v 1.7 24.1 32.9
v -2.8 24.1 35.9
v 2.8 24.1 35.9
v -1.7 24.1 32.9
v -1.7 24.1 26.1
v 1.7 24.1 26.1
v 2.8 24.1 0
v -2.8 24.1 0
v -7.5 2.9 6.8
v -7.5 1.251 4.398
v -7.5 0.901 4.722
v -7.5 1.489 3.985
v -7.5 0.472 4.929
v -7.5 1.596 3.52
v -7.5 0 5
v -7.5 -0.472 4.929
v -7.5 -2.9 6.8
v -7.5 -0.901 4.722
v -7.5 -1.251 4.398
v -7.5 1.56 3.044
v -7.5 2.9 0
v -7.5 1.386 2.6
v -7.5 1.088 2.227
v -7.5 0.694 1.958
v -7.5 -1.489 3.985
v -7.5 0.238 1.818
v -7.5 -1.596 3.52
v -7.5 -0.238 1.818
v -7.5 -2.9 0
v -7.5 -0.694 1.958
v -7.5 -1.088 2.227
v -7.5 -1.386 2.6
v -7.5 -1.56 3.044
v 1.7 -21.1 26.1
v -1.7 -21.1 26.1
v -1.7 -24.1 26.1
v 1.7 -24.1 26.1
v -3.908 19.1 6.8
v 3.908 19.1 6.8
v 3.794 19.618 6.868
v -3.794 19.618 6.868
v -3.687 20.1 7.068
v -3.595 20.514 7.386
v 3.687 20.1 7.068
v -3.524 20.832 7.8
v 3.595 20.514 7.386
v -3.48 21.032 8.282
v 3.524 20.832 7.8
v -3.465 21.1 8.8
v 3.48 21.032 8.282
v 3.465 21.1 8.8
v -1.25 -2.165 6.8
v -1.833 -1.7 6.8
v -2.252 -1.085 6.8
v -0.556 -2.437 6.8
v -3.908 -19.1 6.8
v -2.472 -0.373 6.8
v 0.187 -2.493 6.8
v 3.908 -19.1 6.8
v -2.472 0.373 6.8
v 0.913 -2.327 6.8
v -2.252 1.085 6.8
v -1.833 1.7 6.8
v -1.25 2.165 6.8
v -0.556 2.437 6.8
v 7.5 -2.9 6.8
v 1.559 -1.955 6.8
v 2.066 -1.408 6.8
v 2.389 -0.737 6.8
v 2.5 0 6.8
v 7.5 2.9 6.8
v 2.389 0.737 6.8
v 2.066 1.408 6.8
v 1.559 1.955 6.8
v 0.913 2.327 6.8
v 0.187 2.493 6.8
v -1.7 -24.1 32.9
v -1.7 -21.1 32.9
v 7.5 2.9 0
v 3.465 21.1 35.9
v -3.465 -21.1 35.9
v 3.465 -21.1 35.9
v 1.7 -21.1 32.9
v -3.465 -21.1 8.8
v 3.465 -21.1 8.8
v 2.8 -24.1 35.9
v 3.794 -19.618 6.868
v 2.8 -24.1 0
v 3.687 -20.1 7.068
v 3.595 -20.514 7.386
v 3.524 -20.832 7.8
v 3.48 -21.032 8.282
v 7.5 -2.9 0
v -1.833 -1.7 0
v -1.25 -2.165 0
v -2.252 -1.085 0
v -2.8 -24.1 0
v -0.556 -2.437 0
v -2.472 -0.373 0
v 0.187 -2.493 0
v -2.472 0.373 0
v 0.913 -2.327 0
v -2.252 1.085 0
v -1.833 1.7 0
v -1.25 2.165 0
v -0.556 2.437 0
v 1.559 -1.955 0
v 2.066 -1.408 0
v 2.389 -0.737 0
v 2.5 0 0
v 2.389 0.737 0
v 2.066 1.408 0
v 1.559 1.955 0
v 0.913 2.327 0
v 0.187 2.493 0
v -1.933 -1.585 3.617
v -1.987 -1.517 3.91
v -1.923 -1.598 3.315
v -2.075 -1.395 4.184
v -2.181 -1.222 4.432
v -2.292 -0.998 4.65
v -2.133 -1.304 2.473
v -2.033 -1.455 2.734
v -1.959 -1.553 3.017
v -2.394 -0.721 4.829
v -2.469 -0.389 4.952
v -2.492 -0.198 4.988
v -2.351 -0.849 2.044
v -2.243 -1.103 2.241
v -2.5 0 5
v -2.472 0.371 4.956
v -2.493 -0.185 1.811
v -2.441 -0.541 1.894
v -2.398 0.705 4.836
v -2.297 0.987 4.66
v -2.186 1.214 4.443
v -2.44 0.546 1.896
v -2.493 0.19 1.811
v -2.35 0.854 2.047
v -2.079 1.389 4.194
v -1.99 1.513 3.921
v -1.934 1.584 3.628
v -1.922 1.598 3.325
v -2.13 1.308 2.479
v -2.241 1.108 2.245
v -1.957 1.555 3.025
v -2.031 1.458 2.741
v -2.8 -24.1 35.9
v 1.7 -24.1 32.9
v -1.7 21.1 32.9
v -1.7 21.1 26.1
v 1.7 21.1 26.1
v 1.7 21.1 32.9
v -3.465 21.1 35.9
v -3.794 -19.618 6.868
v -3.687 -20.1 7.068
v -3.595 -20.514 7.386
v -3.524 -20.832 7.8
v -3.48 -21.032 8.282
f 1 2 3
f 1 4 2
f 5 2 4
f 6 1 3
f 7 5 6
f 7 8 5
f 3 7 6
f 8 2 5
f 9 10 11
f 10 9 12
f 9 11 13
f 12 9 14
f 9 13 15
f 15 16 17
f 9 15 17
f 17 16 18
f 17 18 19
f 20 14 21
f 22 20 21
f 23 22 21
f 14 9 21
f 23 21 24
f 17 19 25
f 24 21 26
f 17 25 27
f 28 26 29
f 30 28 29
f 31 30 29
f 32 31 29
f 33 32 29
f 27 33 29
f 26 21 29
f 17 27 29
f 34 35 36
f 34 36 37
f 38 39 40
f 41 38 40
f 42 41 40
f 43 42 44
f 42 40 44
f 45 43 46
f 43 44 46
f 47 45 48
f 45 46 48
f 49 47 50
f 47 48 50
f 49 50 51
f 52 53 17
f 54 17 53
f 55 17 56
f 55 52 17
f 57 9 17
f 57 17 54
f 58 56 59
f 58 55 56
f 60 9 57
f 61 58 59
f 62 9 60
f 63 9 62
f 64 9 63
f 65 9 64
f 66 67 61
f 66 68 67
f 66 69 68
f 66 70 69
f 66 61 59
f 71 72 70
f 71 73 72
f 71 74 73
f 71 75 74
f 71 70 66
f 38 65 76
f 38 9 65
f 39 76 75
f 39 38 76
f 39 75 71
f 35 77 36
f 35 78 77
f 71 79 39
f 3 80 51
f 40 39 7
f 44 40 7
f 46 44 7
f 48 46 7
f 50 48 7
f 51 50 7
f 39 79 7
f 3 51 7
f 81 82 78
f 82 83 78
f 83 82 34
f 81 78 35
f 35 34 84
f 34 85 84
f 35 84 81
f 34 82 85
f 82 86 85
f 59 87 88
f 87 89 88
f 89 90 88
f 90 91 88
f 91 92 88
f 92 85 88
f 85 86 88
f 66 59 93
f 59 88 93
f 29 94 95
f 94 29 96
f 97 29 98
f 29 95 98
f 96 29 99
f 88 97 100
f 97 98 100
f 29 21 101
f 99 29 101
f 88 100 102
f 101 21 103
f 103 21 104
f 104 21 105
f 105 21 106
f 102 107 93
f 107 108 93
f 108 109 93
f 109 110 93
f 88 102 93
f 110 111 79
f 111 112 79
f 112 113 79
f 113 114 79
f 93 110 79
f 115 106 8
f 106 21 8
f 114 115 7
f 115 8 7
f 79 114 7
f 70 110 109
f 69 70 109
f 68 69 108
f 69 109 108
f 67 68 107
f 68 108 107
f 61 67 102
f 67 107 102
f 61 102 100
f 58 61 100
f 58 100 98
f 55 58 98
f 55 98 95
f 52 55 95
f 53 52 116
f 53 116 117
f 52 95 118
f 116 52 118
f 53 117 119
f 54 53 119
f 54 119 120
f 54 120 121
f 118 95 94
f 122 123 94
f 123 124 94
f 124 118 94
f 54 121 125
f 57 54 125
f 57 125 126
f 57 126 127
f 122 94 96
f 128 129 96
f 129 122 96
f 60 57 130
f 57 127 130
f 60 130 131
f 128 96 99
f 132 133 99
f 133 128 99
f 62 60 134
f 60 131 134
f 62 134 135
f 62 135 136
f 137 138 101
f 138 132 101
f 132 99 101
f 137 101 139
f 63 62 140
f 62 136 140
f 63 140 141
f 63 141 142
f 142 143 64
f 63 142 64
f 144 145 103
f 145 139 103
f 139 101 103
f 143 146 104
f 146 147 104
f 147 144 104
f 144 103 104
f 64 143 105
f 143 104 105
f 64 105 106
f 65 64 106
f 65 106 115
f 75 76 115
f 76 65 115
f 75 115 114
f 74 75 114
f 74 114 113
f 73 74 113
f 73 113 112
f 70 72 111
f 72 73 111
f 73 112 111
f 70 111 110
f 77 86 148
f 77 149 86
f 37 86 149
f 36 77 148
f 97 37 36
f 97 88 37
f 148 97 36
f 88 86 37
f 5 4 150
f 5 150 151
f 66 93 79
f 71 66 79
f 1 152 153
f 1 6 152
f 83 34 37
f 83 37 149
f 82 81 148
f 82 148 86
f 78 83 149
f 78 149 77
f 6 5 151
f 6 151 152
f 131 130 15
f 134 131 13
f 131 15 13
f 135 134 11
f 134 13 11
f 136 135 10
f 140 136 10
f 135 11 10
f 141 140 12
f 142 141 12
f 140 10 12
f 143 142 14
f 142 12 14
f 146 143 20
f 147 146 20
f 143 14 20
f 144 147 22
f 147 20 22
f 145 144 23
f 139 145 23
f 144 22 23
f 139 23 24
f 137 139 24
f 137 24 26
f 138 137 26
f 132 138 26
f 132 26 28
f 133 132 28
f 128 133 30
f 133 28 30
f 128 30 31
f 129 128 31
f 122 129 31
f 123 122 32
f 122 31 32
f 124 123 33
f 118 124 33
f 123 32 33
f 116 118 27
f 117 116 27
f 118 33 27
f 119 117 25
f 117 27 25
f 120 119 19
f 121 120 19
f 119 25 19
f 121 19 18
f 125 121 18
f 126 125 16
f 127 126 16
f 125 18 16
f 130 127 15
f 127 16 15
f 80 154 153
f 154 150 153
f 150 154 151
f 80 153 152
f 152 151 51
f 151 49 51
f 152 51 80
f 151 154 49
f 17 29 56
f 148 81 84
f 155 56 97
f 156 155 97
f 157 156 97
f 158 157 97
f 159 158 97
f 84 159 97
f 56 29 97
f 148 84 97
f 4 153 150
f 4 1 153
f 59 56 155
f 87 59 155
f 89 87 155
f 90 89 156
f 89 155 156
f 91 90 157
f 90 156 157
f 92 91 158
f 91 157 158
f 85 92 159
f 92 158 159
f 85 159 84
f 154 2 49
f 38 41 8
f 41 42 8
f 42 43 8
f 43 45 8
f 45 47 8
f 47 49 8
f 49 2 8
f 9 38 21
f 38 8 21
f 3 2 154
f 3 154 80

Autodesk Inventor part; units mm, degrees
ref_plane "YZ Plane" through (0, 0, 0) normal (1, 0, 0) x (0, 1, 0)
ref_plane "XZ Plane" through (0, 0, 0) normal (0, 1, 0) x (-1, 0, 0)
ref_plane "XY Plane" through (0, 0, 0) normal (0, 0, 1) x (1, 0, 0)
sketch "Sketch1" plane through (0, 0, 0) normal (0, 0, 1) x (1, 0, 0)
  arc A0 (-9.2513, -12.8456) -> (-7.7191, -13.7193) centre (-8.2517, -12.873) ccw projected
  line L0 (-7.7191, -13.7193) -> (-1.0653, -9.532) projected
  arc A1 (1.0653, -9.532) -> (-1.0653, -9.532) centre (0, -11.2247) ccw projected
  line L1 (1.0653, -9.532) -> (7.7191, -13.7193) projected
  arc A2 (7.7191, -13.7193) -> (9.2513, -12.8456) centre (8.2517, -12.873) ccw projected
  arc A3 (12.8456, -9.2513) -> (9.2513, -12.8456) centre (12.75, -12.75) ccw projected
  arc A4 (12.8456, -9.2513) -> (13.7193, -7.7191) centre (12.873, -8.2517) ccw projected
  line L2 (13.7193, -7.7191) -> (9.532, -1.0653) projected
  arc A5 (9.532, 1.0653) -> (9.532, -1.0653) centre (11.2247, 0) ccw projected
  line L3 (9.532, 1.0653) -> (13.7385, 7.7495) projected
  line L4 (7.7677, 13.7499) -> (1.0653, 9.532) projected
  arc A6 (-1.0653, 9.532) -> (1.0653, 9.532) centre (0, 11.2247) ccw projected
  line L5 (-1.0653, 9.532) -> (-7.7191, 13.7193) projected
  arc A7 (-7.7191, 13.7193) -> (-9.2513, 12.8456) centre (-8.2517, 12.873) ccw projected
  arc A8 (-12.8456, 9.2513) -> (-9.2513, 12.8456) centre (-12.75, 12.75) ccw projected
  arc A9 (-12.8456, 9.2513) -> (-13.7193, 7.7191) centre (-12.873, 8.2517) ccw projected
  line L6 (-13.7193, 7.7191) -> (-9.532, 1.0653) projected
  arc A10 (-9.532, -1.0653) -> (-9.532, 1.0653) centre (-11.2247, 0) ccw projected
  line L7 (-9.532, -1.0653) -> (-13.7193, -7.7191) projected
  arc A11 (-13.7193, -7.7191) -> (-12.8456, -9.2513) centre (-12.873, -8.2517) ccw projected
  arc A12 (-9.2513, -12.8456) -> (-12.8456, -9.2513) centre (-12.75, -12.75) ccw projected
  circle A13 centre (0, 0) radius 2.5 projected
  circle A14 centre (0, 0) radius 2 projected
  circle A15 centre (0, 0) radius 2.1
  line L8 (2.8, -24.1) -> (-2.8, -24.1)
  line L9 (-2.8, 24.1) -> (2.8, 24.1)
  line L10 (2.8, -24.1) -> (7.5, -2.9)
  line L11 (7.5, 2.9) -> (2.8, 24.1)
  line L12 (-2.8, 24.1) -> (-7.5, 2.9)
  line L13 (-7.5, -2.9) -> (-2.8, -24.1)
  line L14 (7.5, -2.9) -> (7.5, 2.9)
  line L15 (-7.5, 2.9) -> (-7.5, -2.9)
  line L16 (7.5, -2.9) -> (-7.5, -2.9) construction
  line L17 (-7.5, 2.9) -> (7.5, 2.9) construction
  line L18 (2.8, -24.1) -> (2.8, 24.1) construction
  line L19 (-2.8, 24.1) -> (-2.8, -24.1) construction
  line L20 (7.5, 0) -> (0, 0) construction
  line L21 (0, 0) -> (-7.5, 0) construction
  line L22 (-2.5, -2.9) -> (-2.5, 2.9) construction
  arc A16 (9.3, 12.8764) -> (7.7677, 13.7499) centre (8.3003, 12.9036) ccw projected
  arc A17 (13.7385, 7.7495) -> (12.8714, 9.2819) centre (12.8922, 8.2822) ccw projected
  arc A18 (9.3, 12.8764) -> (12.8714, 9.2819) centre (12.7987, 12.7812) ccw projected
  dimension "d0" = 0.1
  dimension "d5" = 48.2
  dimension "d6" = 5.6
  dimension "d7" = 5
  dimension "d8" = 5.8
extrude "Extrusion1" add sketch "Sketch1" along normal blind 6.8 contours L13 L15 L12 L5 A6 L4 L11 L14 L10 L1 A1 L0 | L0 A1 L1 L10 L8 L13 | L12 L9 L11 L4 A6 L5
sketch "Sketch2" plane through (-7.5, -2.9, 0) normal (-1, 0, 0) x (0, 0, 1)
  line L0 (0, 5.8) -> (0, 0) projected
  line L1 (0, 0) -> (6.8, 0) projected
  line L2 (6.8, 5.8) -> (6.8, 0) projected
  line L3 (0, 5.8) -> (6.8, 5.8) projected
  circle A0 centre (3.4, 2.9) radius 1.6
  point P0 (0, 2.9)
  dimension "d9" = 3.2
extrude "Extrusion2" cut sketch "Sketch2" against normal blind 7.4875 contours A0
sketch "Sketch3" plane through (0, 0, 6.8) normal (0, 0, 1) x (1, 0, 0)
  line L0 (7.5, 2.9) -> (2.8, 24.1) projected
  line L1 (2.8, 24.1) -> (-2.8, 24.1) projected
  line L2 (-2.8, 24.1) -> (-7.5, 2.9) projected
  line L3 (-7.5, 2.9) -> (-7.5, -2.9) projected
  line L4 (-7.5, -2.9) -> (-2.8, -24.1) projected
  line L5 (-2.8, -24.1) -> (2.8, -24.1) projected
  line L6 (2.8, -24.1) -> (7.5, -2.9) projected
  line L7 (7.5, -2.9) -> (7.5, 2.9) projected
  circle A0 centre (0, 0) radius 2.5 projected
  line L8 (3.4651, -21.1) -> (-3.4651, -21.1)
  line L9 (-3.4651, 21.1) -> (3.4651, 21.1)
  point P0 (0, 0)
  dimension "d19" = 3
  dimension "d20" = 3
extrude "Extrusion3" add sketch "Sketch3" along normal blind 29.1 contours L9 L2 L1 L0 | L6 L5 L4 L8
sketch "Sketch4" plane through (-2.8, 24.1, 0) normal (0, 1, 0) x (1, 0, 0)
  line L0 (5.6, 0) -> (0, 0) construction
  line L1 (0, 0) -> (0, -35.9) construction
  line L2 (5.6, 0) -> (5.6, -35.9) construction
  line L3 (5.6, -35.9) -> (0, -35.9) projected
  line L4 (6.2651, -35.9) -> (-0.6651, -35.9) construction
  line L5 (2.8, -35.9) -> (2.8, 0) construction
  line L6 (5.6, -32.9) -> (0, -32.9) construction
  line L7 (4.5, -32.9) -> (1.1, -32.9)
  line L8 (1.1, -32.9) -> (1.1, -26.1)
  line L9 (1.1, -26.1) -> (4.5, -26.1)
  line L10 (4.5, -26.1) -> (4.5, -32.9)
  dimension "d23" = 3
  dimension "d25" = 3.4
  dimension "d26" = 6.8
extrude "Extrusion4" cut sketch "Sketch4" against normal through all
fillet "Fillet1" radius 2 2 edges at (0, -21.1, 6.8) (0, 21.1, 6.8)
equation "\"d20\" = d19"
equation "\"d26\" = 2 * d25"
properties part number "TurretPressFit"
